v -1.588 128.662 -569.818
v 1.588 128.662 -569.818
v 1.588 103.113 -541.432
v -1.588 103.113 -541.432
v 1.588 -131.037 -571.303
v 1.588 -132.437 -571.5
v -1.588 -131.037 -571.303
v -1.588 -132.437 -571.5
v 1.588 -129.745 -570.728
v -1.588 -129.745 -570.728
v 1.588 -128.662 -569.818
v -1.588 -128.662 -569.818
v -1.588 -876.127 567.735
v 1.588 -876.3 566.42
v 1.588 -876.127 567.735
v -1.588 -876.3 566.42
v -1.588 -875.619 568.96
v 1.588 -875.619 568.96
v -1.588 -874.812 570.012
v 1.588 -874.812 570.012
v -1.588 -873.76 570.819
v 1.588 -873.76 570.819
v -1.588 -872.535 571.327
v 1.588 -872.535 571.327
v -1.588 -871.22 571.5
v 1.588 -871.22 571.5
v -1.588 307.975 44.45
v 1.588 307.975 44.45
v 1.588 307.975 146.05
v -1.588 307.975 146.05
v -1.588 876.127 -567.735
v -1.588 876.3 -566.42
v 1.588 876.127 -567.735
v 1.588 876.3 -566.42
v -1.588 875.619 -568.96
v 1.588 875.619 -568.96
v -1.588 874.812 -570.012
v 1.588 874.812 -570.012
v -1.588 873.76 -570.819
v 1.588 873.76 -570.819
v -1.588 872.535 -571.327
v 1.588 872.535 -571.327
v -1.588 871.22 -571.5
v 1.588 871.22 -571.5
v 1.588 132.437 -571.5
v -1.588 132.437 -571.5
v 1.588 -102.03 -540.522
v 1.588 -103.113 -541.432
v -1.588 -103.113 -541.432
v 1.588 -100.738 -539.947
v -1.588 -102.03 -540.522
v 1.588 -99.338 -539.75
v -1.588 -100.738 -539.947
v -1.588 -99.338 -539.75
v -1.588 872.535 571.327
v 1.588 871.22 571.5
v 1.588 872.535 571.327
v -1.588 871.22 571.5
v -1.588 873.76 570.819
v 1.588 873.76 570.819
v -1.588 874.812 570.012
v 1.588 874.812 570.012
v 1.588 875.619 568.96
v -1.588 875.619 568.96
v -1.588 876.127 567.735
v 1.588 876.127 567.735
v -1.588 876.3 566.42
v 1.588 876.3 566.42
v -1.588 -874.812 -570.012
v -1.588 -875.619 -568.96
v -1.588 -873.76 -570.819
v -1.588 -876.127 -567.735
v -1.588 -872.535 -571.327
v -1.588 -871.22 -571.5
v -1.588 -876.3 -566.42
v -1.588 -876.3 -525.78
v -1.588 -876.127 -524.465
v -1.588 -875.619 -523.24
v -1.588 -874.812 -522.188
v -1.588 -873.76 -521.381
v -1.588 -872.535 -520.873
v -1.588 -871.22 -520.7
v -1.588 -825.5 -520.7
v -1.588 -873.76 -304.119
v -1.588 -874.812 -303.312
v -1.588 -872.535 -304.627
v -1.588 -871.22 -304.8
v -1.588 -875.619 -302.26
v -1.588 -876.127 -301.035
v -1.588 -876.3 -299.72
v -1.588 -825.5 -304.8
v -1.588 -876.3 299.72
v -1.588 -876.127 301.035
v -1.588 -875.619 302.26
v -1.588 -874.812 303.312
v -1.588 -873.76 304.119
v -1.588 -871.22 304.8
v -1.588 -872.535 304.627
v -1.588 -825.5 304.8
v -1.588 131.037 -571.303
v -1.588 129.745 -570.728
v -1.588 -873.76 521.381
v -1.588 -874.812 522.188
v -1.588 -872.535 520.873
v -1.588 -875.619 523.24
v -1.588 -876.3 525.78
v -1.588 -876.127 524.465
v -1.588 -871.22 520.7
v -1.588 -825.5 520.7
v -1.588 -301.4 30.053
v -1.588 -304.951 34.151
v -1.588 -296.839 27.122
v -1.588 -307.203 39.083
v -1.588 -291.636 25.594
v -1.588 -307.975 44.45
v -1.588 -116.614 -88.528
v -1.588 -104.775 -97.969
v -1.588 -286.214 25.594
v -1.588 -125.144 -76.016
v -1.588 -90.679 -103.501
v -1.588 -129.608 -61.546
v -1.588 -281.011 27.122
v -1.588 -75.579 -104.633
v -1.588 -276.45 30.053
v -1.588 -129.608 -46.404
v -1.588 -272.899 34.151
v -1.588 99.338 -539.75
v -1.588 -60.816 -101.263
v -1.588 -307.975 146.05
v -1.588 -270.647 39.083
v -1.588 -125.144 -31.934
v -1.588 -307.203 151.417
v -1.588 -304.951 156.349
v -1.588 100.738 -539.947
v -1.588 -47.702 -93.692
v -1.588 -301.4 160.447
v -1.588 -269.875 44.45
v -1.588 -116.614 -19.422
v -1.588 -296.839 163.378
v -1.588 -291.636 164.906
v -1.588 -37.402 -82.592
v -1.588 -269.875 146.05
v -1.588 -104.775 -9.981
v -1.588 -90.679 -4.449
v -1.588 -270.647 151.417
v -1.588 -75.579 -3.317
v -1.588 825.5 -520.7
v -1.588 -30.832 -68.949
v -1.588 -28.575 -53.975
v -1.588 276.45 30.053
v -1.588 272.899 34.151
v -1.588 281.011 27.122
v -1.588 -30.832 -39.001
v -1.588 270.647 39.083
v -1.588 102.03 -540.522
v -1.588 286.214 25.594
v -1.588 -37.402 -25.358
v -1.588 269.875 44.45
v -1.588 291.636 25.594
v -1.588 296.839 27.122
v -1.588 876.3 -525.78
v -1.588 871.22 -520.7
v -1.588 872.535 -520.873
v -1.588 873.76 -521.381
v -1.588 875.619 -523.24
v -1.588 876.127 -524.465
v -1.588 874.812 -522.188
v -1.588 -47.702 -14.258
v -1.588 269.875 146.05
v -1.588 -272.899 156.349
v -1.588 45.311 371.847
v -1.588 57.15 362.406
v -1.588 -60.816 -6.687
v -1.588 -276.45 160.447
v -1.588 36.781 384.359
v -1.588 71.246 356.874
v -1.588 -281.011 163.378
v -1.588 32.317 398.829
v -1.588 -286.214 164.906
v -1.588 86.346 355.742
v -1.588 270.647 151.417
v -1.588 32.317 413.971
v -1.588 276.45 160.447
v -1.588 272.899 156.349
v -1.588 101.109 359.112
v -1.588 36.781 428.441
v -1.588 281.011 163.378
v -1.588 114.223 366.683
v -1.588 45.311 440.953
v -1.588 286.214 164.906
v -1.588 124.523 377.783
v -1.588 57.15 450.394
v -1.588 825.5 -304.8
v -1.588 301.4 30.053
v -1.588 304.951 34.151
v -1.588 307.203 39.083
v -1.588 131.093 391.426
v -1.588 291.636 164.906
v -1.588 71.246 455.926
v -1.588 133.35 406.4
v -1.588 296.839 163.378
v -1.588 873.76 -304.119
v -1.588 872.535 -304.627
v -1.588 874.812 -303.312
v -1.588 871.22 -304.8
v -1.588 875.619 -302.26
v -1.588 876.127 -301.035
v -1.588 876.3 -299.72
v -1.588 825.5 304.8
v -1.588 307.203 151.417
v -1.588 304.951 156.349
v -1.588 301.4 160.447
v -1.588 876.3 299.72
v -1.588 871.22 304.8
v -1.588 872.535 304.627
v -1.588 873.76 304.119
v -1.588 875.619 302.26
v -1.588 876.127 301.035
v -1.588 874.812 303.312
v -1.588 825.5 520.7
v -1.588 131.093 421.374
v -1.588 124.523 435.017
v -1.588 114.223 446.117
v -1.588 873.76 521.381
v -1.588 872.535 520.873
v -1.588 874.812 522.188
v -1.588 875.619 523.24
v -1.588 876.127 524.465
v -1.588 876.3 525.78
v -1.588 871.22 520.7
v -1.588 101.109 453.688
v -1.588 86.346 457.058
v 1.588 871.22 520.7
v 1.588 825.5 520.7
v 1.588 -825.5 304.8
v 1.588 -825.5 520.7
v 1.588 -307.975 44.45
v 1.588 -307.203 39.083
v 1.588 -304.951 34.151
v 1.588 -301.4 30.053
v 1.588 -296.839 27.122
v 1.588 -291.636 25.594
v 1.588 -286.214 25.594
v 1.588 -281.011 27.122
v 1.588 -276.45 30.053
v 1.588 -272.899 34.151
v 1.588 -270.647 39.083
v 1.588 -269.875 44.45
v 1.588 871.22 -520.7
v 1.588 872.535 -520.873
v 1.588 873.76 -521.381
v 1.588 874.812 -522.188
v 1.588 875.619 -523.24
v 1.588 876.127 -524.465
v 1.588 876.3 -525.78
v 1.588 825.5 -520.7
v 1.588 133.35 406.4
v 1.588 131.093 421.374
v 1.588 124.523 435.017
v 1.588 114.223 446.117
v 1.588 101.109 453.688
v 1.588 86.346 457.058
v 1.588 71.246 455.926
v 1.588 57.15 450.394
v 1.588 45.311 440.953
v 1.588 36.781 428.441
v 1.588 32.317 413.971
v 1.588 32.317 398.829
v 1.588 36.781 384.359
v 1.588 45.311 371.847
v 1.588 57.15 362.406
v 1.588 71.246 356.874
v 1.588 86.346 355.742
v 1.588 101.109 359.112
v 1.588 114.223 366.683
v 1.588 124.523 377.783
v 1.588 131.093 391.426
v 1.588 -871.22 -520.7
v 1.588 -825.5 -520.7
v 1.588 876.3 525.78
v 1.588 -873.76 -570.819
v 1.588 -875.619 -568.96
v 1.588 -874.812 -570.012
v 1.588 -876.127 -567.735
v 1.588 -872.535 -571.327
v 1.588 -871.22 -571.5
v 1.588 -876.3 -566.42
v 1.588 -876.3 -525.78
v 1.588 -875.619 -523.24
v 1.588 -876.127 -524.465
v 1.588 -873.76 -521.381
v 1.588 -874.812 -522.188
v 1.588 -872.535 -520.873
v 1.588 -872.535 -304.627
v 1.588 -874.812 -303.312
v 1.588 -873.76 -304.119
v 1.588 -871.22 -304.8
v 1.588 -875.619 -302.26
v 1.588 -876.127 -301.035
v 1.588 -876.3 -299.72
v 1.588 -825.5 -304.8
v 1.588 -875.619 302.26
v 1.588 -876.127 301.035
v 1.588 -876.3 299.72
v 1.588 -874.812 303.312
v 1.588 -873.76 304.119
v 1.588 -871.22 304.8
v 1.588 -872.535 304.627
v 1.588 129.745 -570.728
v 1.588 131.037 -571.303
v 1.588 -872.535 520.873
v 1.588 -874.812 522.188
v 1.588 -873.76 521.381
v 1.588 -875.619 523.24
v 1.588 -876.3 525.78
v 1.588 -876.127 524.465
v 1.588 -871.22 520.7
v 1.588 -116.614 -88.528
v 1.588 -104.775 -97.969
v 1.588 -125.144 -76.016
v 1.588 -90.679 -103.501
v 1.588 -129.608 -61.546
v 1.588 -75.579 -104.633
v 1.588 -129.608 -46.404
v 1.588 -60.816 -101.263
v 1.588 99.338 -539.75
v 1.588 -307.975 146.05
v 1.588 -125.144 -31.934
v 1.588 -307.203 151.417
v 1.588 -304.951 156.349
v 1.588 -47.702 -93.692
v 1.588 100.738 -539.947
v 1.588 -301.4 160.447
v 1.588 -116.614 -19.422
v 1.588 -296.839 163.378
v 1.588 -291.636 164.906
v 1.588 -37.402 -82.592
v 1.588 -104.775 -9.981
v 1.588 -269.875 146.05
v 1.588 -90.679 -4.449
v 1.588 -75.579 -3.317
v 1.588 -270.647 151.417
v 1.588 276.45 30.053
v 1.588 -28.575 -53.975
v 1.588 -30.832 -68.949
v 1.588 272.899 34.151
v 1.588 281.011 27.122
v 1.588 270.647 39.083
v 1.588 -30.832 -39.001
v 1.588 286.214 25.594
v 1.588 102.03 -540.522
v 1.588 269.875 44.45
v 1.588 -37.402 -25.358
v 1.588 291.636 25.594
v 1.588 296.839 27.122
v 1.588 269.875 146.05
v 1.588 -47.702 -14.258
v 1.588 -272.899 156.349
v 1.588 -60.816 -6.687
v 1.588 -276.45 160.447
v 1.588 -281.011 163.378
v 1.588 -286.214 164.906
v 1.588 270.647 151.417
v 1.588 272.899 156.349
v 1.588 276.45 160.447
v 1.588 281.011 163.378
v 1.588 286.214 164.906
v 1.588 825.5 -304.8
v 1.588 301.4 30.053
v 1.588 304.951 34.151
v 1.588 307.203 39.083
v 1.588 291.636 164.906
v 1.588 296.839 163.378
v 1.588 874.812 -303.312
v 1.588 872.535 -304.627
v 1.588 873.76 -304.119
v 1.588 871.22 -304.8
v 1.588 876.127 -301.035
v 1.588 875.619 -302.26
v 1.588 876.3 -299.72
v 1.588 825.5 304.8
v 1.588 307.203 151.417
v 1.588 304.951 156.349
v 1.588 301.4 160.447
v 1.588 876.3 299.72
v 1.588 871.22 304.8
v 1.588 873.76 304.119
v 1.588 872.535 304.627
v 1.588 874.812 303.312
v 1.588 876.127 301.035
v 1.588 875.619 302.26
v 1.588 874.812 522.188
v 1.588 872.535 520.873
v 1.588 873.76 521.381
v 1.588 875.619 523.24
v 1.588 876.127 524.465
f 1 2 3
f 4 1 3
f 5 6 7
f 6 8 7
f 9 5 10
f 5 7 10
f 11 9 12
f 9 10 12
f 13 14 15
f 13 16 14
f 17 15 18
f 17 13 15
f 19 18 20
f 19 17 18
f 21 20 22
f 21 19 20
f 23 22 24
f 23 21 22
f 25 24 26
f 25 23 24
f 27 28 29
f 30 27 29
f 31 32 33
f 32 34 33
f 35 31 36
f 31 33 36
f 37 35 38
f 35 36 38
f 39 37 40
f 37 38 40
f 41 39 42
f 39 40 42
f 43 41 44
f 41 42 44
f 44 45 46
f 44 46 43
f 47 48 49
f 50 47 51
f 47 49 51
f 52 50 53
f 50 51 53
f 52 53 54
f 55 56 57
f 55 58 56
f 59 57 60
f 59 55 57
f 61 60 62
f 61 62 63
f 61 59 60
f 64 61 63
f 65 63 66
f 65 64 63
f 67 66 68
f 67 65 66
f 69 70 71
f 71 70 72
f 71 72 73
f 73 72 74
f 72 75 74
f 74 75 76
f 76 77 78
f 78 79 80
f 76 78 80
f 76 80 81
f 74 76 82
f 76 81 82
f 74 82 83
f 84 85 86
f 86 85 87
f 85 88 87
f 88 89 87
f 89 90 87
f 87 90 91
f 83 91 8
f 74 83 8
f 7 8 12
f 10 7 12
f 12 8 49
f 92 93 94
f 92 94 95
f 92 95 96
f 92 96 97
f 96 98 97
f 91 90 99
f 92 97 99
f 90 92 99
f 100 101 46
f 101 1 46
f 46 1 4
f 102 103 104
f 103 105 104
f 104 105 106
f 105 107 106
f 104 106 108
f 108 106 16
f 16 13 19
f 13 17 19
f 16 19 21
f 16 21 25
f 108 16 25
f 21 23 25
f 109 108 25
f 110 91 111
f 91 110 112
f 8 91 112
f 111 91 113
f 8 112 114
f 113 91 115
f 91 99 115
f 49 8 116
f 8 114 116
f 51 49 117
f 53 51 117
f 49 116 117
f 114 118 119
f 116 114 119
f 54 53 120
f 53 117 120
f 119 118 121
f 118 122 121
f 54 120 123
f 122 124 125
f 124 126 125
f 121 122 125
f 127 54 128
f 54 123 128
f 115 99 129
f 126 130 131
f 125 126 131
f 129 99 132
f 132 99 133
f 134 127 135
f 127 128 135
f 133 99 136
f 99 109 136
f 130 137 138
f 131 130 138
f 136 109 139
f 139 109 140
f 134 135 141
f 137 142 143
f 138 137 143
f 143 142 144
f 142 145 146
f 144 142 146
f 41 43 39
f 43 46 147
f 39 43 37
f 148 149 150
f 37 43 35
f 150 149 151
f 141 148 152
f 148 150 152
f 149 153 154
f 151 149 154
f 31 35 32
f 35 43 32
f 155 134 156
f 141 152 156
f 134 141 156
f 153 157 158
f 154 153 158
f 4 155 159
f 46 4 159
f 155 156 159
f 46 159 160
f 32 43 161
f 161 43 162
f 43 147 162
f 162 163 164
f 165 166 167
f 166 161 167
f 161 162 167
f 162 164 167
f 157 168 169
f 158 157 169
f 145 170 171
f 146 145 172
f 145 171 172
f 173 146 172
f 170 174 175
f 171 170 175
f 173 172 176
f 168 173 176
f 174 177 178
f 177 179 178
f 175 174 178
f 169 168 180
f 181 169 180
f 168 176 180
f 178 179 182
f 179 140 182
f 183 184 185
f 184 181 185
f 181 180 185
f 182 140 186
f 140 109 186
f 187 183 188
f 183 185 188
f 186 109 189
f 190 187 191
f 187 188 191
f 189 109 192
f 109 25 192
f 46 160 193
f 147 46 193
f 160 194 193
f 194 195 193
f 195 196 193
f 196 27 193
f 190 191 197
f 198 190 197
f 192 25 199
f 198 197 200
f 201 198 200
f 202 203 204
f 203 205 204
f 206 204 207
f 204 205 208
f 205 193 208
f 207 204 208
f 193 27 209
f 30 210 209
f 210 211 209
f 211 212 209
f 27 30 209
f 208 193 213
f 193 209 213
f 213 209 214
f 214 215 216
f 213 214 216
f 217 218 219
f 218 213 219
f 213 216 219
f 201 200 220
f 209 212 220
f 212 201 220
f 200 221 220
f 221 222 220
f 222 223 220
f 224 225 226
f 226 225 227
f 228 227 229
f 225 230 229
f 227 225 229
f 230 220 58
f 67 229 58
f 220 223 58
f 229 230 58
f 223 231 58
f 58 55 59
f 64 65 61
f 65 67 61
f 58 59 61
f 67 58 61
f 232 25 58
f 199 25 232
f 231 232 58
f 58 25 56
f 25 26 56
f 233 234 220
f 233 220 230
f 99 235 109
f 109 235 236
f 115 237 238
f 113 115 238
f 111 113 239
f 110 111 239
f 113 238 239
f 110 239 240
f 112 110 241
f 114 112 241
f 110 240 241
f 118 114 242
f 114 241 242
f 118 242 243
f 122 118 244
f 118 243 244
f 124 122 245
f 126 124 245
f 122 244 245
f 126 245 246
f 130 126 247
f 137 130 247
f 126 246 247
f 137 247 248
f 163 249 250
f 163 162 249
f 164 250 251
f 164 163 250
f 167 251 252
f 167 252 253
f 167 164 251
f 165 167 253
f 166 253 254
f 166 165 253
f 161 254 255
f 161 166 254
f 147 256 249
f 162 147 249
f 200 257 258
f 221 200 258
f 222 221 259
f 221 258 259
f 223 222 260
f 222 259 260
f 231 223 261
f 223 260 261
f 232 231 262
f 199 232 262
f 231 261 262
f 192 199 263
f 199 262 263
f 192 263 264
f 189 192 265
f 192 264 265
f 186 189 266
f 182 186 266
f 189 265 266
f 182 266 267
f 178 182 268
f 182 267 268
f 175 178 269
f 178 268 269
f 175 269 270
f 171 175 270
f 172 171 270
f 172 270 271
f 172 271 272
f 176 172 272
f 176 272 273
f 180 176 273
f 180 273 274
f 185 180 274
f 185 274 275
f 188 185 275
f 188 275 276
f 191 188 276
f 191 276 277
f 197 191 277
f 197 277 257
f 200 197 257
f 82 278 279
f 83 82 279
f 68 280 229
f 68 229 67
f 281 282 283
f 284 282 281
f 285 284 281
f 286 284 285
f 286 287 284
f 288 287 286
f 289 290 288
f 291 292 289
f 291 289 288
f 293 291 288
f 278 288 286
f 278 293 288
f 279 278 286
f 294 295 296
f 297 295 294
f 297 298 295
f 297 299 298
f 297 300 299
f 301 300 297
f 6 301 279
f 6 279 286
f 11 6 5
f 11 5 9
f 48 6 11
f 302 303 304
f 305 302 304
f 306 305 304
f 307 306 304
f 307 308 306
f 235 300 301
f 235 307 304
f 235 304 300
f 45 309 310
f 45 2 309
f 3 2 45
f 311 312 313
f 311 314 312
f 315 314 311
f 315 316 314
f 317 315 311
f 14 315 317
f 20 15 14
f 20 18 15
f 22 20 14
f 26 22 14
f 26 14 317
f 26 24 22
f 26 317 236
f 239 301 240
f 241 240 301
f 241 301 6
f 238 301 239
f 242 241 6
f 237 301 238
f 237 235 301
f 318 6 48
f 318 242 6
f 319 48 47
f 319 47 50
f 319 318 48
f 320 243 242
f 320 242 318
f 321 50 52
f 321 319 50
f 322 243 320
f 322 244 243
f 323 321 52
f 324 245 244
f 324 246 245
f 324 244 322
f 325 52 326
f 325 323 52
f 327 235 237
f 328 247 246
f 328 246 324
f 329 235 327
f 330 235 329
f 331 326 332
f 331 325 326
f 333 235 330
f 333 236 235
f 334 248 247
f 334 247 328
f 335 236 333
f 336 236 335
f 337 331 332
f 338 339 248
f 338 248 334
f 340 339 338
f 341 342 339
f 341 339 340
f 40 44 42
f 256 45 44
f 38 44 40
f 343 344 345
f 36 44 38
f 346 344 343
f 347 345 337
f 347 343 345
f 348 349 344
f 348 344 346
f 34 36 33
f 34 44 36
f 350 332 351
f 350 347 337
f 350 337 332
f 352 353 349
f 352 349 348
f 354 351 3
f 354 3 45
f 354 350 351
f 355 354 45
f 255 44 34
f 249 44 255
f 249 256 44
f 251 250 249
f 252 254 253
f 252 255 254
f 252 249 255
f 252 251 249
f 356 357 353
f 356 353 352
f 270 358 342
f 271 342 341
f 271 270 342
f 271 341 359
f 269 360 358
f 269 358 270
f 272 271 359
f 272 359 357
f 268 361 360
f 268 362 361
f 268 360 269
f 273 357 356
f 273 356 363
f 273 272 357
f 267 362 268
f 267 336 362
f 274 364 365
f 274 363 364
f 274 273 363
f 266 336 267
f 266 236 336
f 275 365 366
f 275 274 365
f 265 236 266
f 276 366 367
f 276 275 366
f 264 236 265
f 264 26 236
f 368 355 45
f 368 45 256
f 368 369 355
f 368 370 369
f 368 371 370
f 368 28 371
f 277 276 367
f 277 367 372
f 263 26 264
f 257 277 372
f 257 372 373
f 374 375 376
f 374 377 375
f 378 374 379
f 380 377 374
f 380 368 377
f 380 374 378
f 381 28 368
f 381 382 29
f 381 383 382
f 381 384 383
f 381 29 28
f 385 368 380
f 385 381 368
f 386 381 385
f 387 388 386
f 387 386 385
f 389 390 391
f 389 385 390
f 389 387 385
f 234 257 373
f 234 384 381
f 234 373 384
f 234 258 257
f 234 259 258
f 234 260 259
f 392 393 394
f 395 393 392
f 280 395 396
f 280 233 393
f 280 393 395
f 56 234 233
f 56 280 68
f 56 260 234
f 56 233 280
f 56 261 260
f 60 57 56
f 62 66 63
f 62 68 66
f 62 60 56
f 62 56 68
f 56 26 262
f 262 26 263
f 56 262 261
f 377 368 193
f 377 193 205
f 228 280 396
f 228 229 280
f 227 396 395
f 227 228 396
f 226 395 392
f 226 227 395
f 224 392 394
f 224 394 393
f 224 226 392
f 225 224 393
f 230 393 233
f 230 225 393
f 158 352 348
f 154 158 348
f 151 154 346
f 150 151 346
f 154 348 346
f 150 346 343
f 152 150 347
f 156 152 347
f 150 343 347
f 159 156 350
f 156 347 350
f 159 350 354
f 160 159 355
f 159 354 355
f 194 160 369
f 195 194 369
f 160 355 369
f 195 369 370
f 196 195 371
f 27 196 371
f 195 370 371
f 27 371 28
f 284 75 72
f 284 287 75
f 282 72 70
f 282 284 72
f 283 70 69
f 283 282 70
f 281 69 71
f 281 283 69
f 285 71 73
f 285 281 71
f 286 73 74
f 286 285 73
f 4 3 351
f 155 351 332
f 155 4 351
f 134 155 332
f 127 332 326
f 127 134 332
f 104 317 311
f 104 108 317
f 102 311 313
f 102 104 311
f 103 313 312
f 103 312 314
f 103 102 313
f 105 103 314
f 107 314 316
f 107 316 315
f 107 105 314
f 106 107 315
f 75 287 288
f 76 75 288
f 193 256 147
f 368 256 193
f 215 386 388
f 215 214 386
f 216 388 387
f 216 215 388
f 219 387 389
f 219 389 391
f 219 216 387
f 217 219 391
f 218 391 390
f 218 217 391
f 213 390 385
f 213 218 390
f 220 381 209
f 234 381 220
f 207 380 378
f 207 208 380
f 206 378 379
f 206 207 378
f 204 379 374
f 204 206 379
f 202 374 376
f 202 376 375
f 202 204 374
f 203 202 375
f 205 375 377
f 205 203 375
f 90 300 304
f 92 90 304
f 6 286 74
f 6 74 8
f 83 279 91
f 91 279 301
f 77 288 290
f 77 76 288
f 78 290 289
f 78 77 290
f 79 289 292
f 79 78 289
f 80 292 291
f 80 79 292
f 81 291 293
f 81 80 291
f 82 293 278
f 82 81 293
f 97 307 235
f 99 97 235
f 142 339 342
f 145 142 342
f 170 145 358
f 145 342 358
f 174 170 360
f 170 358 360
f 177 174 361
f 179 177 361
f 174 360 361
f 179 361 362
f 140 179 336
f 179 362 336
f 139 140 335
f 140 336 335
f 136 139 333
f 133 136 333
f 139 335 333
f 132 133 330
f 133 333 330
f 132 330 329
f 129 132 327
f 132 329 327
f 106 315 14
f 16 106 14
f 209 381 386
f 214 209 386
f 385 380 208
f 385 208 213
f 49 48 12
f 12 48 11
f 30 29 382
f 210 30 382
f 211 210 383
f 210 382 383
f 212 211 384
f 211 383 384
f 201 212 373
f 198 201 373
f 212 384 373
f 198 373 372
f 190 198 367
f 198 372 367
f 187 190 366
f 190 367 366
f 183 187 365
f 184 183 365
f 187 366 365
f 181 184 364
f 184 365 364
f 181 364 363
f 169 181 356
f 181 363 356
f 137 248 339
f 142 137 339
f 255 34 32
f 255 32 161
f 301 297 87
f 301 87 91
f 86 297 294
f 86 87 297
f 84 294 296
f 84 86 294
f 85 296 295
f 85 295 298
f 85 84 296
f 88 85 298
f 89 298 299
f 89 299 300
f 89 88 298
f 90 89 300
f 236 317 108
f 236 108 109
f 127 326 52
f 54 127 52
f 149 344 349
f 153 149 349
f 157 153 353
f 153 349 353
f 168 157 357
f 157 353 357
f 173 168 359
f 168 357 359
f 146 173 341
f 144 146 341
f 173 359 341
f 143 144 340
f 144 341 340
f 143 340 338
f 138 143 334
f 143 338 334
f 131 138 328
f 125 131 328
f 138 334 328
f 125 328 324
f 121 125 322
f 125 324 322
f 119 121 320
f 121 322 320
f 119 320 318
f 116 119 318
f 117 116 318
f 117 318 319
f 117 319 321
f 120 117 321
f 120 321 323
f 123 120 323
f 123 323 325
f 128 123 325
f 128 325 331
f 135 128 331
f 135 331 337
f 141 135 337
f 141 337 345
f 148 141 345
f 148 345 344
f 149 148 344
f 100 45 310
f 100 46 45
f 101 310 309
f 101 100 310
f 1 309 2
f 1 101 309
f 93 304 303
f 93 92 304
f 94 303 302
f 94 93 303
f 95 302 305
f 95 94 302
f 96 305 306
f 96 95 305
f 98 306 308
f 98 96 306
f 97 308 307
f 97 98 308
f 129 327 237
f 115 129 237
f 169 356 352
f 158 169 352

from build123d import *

# Parameters (mm, degrees)
F0_W     = 1752.6
F0_H     = 1143
F1_DEPTH = 1.5875
F2_W     = 50.8
F2_H     = 215.9
F3_DEPTH = 3.176
F5_DEPTH = 3.176
F6_R     = 50.8
F7_DEPTH = 3.176
F9_DEPTH = 3.176
F10_R    = 5.08


with BuildPart() as f1:
    # F0 (on Right) → F1 (new body, symmetric)
    with BuildSketch(Plane.YZ):
        Rectangle(F0_W, F0_H)
    extrude(amount=F1_DEPTH, both=True)

    # F2 (on face) → F3 (cut, through all)
    with BuildSketch(Plane.YZ.offset(1.5875)):
        with Locations((-850.9, 412.75)):
            Rectangle(F2_W, F2_H)
        with Locations((850.9, 412.75)):
            Rectangle(F2_W, F2_H)
        with Locations((-850.9, -412.75)):
            Rectangle(F2_W, F2_H)
        with Locations((850.9, -412.75)):
            Rectangle(F2_W, F2_H)
    extrude(amount=-F3_DEPTH, mode=Mode.SUBTRACT)

    # F4 (on face) → F5 (cut, through all)
    with BuildSketch(Plane.YZ.offset(1.5875)):
        with BuildLine():
            Line((-269.875, 44.45), (-269.875, 146.05))
            ThreePointArc((-269.875, 146.05), (-288.925, 165.1), (-307.975, 146.05))
            Line((-307.975, 146.05), (-307.975, 44.45))
            ThreePointArc((-307.975, 44.45), (-288.925, 25.4), (-269.875, 44.45))
        make_face()
        with BuildLine():
            ThreePointArc((307.975, 146.05), (288.925, 165.1), (269.875, 146.05))
            Line((269.875, 146.05), (269.875, 44.45))
            ThreePointArc((269.875, 44.45), (288.925, 25.4), (307.975, 44.45))
            Line((307.975, 44.45), (307.975, 146.05))
        make_face()
    extrude(amount=-F5_DEPTH, mode=Mode.SUBTRACT)

    # F6 (on face) → F7 (cut, through all)
    with BuildSketch(Plane.YZ.offset(1.5875)):
        with Locations((82.55, 406.4)):
            Circle(F6_R)
        with Locations((-79.375, -53.975)):
            Circle(F6_R)
    extrude(amount=-F7_DEPTH, mode=Mode.SUBTRACT)

    # F8 (on face) → F9 (cut, through all)
    with BuildSketch(Plane.YZ.offset(1.5875)):
        Polygon((-101.6, -539.75), (-130.175, -571.5), (130.175, -571.5), (101.6, -539.75), align=None)
    extrude(amount=-F9_DEPTH, mode=Mode.SUBTRACT)

    # F10
    f10_edges = [f1.edges().sort_by_distance(p)[0] for p in [
        (0, -876.3, -571.5),
        (0, -876.3, -520.7),
        (0, -876.3, -304.8),
        (0, -876.3, 304.8),
        (0, -876.3, 520.7),
        (0, -876.3, 571.5),
        (0, 876.3, 571.5),
        (0, 876.3, 520.7),
        (0, 876.3, 304.8),
        (0, 876.3, -304.8),
        (0, 876.3, -520.7),
        (0, 876.3, -571.5),
        (0, 130.175, -571.5),
        (0, -130.175, -571.5),
        (0, -101.6, -539.75),
        (0, 101.6, -539.75),
    ]]
    fillet(f10_edges, radius=F10_R)


solid = f1.part
